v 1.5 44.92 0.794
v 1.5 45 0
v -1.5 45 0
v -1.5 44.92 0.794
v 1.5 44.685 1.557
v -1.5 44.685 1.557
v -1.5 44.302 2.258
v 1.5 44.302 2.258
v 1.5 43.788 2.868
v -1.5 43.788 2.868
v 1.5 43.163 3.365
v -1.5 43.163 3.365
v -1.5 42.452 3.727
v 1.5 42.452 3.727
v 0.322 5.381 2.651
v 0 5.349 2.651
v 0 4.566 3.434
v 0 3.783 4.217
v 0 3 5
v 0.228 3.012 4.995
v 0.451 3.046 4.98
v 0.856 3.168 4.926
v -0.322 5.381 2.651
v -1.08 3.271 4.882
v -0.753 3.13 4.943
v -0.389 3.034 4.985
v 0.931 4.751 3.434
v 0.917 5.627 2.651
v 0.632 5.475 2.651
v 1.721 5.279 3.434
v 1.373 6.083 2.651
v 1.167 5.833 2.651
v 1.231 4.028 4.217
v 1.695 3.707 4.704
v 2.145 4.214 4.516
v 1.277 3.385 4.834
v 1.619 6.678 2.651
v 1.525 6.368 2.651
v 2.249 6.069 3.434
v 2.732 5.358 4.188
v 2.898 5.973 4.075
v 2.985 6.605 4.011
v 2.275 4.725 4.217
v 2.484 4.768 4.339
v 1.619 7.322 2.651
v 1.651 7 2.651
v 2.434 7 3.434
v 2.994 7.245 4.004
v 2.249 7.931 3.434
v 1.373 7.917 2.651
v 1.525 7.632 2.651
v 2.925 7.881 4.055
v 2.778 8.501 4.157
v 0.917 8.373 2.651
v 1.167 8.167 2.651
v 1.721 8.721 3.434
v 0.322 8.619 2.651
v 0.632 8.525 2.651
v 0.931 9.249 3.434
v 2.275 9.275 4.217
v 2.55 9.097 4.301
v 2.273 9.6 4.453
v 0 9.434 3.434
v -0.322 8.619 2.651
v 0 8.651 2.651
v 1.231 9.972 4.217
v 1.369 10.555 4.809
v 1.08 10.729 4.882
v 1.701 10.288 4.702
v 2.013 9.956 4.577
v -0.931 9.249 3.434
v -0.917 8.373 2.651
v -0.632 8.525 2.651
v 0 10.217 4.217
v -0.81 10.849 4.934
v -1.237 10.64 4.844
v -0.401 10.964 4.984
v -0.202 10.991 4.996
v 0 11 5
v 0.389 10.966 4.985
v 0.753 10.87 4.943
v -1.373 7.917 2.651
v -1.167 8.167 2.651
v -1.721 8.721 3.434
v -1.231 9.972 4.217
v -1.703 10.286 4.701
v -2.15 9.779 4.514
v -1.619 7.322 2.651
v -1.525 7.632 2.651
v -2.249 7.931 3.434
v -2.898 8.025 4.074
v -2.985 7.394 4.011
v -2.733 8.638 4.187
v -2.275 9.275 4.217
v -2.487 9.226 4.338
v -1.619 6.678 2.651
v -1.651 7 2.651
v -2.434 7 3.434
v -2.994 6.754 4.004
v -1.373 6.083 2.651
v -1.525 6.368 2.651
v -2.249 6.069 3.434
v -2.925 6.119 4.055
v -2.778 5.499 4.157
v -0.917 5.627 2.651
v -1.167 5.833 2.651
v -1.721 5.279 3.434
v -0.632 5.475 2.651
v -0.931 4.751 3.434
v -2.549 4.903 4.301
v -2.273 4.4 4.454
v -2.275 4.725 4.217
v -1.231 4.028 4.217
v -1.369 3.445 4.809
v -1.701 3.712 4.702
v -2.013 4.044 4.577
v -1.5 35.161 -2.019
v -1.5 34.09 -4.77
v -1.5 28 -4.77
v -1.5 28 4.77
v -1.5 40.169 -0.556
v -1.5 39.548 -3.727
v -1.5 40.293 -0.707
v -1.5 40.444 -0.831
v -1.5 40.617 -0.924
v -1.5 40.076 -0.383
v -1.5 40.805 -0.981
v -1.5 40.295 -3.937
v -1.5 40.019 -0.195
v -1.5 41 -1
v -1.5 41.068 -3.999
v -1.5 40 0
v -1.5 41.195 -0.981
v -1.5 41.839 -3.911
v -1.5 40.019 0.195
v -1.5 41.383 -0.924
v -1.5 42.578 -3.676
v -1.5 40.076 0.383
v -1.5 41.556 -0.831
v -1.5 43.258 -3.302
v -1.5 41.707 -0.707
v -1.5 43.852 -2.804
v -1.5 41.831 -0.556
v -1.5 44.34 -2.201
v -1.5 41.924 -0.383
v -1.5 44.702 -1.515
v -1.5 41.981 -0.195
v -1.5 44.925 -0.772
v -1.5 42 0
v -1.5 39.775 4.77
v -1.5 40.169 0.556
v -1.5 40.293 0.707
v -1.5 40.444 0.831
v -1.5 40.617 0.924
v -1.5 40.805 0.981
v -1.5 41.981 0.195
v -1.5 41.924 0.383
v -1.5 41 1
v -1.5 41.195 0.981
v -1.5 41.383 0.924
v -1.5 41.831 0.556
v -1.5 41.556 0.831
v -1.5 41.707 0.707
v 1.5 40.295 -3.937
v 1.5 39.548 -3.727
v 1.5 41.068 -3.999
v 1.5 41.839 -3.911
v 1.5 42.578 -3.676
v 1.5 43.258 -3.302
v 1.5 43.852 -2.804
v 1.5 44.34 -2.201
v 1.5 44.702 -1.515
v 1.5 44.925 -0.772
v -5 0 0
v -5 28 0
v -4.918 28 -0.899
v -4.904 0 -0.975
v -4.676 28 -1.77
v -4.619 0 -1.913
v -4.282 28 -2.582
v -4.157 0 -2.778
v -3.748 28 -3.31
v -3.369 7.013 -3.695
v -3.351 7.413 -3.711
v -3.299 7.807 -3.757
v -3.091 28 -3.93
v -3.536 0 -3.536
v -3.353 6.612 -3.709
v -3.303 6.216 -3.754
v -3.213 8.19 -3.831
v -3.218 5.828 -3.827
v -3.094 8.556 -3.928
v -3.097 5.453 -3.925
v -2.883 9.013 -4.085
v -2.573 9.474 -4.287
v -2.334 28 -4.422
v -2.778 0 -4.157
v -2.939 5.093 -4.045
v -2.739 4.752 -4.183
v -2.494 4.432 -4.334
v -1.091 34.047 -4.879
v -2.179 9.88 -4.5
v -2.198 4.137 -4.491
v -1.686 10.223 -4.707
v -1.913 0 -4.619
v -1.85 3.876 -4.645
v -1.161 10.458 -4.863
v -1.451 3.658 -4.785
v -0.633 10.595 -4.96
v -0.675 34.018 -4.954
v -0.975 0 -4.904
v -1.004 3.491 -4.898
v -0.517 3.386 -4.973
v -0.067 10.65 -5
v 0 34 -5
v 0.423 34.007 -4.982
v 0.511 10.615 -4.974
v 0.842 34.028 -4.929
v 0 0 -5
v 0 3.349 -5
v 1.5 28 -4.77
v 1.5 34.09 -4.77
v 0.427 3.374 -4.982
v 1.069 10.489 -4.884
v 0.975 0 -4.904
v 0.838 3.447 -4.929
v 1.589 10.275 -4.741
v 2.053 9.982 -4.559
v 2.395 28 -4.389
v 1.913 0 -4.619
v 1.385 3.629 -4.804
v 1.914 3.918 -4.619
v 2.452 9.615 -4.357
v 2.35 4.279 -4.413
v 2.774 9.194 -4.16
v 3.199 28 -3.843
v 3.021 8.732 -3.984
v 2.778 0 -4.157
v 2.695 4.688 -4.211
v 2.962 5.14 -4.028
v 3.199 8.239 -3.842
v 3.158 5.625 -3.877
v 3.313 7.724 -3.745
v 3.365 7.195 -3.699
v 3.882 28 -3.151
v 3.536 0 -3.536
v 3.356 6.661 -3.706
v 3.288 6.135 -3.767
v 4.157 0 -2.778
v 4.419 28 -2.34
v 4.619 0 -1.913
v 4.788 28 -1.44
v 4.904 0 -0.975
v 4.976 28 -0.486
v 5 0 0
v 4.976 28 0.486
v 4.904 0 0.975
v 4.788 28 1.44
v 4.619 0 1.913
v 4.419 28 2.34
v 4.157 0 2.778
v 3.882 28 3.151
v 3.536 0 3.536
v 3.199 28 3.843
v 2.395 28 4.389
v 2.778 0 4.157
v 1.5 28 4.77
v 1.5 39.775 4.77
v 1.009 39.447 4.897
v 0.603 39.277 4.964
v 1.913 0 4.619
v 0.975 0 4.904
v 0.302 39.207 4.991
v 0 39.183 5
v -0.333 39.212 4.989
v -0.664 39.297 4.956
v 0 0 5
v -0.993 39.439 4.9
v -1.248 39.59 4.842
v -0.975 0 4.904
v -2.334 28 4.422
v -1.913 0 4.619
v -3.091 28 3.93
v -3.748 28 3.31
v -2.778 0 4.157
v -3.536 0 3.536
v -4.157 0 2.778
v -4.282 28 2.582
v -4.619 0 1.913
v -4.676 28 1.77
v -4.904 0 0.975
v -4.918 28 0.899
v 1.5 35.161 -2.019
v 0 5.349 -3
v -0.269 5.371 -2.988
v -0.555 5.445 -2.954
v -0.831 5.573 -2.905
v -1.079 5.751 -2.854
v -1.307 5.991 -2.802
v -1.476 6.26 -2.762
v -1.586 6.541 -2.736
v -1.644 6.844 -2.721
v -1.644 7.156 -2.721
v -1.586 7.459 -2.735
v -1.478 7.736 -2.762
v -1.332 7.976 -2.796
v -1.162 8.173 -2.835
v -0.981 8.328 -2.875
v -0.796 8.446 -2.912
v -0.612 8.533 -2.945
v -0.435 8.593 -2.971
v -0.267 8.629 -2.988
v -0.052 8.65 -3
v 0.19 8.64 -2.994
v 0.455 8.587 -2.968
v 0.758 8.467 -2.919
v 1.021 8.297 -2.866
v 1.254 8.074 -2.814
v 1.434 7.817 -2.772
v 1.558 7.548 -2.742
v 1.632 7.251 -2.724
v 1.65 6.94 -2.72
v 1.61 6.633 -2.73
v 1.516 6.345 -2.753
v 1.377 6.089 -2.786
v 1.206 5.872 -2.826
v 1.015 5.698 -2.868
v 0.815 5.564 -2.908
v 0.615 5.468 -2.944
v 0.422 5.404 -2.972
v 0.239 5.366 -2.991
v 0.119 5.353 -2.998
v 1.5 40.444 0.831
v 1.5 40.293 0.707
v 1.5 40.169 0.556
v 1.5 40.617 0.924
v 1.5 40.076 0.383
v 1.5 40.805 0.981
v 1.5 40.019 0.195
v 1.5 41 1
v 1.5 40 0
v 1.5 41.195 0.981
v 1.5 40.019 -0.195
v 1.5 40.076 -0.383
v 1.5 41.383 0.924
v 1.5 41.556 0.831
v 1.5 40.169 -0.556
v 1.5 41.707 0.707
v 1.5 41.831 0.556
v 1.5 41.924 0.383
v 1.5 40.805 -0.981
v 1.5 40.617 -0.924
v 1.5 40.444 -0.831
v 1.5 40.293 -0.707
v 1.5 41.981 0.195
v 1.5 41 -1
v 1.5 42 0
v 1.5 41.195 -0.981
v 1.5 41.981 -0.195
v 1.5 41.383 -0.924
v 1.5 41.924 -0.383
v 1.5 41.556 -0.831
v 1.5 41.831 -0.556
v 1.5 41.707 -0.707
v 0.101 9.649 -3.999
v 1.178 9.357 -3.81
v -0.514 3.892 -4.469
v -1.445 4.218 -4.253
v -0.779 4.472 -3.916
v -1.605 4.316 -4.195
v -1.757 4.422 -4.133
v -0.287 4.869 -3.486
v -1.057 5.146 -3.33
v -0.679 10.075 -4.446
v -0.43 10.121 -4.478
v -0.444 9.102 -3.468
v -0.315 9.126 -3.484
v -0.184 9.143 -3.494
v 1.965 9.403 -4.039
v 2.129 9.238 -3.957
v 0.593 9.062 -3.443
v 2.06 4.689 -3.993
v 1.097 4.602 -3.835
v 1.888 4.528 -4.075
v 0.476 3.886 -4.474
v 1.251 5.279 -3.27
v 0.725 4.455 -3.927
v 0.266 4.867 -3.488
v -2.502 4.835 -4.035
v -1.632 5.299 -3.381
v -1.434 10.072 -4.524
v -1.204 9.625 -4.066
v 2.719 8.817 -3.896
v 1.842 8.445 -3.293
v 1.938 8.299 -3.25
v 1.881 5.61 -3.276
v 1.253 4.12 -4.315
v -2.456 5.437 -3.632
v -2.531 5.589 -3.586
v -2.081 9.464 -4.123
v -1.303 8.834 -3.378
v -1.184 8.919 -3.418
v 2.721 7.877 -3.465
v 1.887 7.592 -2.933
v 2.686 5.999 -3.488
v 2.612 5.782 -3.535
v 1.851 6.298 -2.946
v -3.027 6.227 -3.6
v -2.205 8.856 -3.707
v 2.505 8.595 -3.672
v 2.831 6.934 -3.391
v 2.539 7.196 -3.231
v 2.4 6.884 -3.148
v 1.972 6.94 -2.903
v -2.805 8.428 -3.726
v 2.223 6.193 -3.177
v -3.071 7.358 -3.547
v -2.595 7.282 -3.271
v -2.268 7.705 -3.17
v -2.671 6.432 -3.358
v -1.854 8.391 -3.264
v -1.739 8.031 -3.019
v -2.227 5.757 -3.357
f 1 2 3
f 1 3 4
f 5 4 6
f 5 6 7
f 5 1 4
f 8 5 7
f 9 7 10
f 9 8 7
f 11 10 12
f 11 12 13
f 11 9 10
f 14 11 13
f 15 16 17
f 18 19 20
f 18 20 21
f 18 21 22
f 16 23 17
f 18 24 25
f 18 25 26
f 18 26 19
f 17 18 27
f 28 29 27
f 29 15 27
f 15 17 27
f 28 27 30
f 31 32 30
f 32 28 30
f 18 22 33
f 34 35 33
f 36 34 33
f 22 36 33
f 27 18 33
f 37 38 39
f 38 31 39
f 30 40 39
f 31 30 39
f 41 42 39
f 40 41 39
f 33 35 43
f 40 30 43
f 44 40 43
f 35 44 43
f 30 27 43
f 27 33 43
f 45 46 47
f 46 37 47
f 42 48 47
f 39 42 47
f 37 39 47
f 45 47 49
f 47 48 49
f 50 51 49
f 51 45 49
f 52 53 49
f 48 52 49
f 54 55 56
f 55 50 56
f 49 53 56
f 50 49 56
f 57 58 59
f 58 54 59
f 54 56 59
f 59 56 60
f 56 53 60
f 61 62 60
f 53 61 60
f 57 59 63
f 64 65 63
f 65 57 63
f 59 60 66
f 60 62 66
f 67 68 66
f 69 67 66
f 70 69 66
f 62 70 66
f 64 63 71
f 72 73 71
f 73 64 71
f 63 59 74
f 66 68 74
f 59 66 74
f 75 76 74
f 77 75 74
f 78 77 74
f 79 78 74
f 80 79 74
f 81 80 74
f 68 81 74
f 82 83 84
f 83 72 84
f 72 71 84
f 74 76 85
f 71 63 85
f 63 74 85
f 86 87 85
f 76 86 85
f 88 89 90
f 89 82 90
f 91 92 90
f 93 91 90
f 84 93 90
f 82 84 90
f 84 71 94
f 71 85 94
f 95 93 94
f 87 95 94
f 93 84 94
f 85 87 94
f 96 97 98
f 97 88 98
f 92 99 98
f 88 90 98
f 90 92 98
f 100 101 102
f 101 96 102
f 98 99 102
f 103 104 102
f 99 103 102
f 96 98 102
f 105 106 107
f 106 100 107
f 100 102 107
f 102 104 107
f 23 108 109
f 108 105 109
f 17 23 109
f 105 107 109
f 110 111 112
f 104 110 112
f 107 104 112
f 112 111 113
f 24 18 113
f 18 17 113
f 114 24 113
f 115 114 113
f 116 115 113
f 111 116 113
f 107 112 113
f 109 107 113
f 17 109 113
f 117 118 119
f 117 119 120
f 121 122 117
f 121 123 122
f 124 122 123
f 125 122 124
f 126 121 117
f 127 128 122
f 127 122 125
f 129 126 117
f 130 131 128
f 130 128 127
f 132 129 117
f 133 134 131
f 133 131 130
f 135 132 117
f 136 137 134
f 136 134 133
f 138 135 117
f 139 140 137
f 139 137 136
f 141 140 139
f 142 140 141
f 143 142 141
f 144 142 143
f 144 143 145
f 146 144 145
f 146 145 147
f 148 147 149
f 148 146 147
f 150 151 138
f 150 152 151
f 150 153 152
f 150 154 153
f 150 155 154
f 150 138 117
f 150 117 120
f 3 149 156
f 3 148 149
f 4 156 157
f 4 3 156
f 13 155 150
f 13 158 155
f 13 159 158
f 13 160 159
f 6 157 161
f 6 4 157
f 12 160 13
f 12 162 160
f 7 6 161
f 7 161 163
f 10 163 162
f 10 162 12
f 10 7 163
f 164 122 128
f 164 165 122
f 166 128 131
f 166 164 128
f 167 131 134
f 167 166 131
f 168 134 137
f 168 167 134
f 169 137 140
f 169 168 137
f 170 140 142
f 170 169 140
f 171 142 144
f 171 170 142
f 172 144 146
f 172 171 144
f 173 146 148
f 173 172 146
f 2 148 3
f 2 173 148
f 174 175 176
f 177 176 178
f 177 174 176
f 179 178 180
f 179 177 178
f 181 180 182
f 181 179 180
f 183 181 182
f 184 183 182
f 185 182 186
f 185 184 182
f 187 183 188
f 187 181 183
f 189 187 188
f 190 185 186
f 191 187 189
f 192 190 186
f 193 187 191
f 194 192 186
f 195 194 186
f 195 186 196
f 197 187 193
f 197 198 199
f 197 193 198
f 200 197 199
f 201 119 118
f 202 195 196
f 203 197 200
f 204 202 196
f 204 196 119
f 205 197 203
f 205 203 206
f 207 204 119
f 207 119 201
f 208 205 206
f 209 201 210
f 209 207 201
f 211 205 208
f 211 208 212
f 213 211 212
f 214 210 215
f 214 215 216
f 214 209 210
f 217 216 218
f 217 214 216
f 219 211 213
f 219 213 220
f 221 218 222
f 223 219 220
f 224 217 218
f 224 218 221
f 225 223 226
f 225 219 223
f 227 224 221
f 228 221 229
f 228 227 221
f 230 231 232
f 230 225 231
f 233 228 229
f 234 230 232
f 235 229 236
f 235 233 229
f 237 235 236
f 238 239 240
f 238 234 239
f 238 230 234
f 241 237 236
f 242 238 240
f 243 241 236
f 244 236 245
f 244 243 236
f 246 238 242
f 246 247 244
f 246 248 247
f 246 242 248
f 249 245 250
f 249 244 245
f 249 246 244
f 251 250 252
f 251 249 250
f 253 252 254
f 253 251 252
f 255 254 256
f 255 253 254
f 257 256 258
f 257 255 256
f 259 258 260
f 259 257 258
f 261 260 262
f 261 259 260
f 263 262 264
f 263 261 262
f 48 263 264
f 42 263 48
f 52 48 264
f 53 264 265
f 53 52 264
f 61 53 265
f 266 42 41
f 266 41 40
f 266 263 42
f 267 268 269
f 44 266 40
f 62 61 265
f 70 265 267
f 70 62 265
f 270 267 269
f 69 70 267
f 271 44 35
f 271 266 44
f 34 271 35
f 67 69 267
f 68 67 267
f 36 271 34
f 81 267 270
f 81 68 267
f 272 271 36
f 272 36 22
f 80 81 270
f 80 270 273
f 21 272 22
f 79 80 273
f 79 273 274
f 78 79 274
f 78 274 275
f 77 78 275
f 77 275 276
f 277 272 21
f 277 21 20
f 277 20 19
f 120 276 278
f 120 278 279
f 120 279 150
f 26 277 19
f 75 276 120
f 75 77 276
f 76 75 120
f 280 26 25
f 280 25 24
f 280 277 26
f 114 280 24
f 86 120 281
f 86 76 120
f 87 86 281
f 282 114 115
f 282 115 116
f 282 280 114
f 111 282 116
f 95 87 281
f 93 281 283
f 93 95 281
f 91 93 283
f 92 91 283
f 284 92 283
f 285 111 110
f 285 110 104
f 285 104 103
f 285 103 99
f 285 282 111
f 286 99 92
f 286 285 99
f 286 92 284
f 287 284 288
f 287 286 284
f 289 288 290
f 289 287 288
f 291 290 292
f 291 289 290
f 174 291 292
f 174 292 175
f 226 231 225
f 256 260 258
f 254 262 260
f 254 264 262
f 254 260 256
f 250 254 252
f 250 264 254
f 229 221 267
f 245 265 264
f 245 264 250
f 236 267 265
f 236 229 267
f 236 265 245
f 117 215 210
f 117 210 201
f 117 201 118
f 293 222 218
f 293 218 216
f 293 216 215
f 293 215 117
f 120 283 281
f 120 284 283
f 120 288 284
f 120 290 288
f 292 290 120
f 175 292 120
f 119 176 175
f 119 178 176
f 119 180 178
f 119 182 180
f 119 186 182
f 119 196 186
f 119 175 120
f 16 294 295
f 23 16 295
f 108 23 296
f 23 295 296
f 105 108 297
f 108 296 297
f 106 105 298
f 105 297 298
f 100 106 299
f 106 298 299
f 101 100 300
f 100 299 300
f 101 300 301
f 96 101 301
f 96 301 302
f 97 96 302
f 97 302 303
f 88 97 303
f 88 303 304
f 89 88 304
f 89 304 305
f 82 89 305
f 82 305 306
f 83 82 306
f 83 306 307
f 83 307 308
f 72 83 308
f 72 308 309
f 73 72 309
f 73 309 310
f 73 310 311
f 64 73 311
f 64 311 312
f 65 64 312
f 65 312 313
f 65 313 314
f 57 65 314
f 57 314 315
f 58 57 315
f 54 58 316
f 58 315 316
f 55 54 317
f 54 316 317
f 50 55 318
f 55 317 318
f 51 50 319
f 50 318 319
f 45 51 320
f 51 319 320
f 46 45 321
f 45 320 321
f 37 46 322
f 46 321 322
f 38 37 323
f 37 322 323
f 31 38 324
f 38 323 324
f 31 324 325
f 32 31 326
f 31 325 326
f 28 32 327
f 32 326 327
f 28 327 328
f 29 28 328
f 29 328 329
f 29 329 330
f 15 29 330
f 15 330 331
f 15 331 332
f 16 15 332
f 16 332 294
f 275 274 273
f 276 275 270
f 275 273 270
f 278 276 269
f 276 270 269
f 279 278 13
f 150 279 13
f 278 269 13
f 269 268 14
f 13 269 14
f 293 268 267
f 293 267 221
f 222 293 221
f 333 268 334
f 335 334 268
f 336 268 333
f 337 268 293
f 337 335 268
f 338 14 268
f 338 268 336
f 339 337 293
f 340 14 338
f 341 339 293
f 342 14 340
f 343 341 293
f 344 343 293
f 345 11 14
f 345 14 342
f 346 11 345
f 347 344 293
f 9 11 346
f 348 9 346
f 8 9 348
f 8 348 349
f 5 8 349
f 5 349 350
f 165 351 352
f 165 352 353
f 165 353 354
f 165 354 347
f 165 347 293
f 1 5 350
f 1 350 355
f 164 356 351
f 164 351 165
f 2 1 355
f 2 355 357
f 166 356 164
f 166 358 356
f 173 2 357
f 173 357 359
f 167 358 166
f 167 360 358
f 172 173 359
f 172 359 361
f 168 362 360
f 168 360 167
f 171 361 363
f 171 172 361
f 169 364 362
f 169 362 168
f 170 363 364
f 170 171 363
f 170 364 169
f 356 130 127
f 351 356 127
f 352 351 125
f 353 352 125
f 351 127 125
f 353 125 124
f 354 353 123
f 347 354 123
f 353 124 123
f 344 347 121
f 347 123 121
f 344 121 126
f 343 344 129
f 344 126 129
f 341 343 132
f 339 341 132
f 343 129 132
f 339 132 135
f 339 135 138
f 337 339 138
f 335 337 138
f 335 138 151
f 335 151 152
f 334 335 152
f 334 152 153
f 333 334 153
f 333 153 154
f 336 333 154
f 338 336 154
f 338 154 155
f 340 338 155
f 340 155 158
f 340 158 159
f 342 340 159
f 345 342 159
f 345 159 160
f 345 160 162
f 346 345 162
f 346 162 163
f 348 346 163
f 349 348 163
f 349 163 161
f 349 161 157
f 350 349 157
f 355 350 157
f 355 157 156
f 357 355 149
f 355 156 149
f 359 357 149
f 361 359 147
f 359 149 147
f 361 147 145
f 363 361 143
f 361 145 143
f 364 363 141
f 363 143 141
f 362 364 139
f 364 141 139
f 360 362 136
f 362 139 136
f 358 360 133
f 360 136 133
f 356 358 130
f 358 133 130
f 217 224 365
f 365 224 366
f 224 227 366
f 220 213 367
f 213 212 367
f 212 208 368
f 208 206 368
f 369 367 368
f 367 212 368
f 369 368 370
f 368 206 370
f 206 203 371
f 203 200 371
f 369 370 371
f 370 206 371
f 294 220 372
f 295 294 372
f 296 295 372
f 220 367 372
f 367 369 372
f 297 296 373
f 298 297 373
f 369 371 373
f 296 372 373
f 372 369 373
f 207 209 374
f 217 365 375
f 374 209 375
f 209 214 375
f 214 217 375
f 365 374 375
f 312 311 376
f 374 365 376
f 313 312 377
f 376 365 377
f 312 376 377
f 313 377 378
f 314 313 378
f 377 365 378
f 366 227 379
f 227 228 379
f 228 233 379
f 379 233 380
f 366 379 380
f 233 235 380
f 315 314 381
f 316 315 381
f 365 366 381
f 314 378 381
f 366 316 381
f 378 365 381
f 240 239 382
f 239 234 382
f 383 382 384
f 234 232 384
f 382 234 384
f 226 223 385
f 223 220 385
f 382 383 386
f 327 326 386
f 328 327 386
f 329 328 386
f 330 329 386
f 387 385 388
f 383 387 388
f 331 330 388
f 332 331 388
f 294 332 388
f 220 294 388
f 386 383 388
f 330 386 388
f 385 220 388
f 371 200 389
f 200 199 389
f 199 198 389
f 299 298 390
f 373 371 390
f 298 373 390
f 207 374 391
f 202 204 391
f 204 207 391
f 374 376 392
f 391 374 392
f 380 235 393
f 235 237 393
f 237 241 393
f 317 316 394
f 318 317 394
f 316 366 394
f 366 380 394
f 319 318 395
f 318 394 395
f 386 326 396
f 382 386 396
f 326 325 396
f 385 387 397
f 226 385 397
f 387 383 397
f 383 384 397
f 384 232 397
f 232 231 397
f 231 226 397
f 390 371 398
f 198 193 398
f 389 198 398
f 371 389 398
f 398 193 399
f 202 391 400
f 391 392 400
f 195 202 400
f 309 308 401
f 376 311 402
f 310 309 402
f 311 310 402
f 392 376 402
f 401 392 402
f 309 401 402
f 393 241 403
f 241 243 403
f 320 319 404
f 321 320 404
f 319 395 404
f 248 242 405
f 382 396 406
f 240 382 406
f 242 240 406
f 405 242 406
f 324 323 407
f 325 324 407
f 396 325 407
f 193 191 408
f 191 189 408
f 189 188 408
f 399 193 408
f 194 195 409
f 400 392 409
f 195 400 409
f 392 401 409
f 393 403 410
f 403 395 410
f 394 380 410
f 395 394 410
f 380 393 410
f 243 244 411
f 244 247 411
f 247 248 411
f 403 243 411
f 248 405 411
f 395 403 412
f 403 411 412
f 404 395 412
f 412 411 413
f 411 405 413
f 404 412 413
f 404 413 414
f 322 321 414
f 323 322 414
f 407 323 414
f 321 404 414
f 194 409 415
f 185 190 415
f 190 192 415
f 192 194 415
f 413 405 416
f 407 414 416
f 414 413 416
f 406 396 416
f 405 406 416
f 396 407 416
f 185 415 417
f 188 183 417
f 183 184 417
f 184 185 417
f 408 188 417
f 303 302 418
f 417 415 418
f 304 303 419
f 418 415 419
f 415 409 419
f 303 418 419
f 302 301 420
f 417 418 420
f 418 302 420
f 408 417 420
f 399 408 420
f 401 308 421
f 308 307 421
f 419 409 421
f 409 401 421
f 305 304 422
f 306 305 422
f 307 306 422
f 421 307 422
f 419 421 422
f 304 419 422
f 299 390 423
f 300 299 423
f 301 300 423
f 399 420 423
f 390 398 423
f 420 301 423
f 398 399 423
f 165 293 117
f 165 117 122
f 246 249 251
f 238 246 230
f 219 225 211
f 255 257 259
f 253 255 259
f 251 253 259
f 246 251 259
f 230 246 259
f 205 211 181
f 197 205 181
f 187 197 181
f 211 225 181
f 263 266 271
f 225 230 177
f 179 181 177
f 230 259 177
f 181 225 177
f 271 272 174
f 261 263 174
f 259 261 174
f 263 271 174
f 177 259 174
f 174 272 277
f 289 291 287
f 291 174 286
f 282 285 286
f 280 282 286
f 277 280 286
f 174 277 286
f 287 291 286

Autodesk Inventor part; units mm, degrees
ref_plane "XZ Plane" through (0, 0, 0) normal (0, 1, 0) x (-1, 0, 0)
sketch "Sketch1" plane through (0, 0, 0) normal (0, 1, 0) x (-1, 0, 0)
  circle A0 centre (0, 0) radius 5
  dimension "d0" = 10
extrude "Extrusion1" add sketch "Sketch1" along normal blind 45
ref_plane "Work Plane1" through (0, 0, 5) normal (0, 0, 1) x (1, 0, 0)
sketch "Sketch2" plane through (0, 0, 5) normal (0, 0, 1) x (1, 0, 0)
  point P0 (0, 0)
  point P1 (0, 7)
  dimension "d3" = 7
hole "Hole1" at (0, 7, 5) direction (0, 0, -1) diameter 3.302 end through all countersink diameter 8 countersink angle 90 thread size "8-32 UNC" class "2B" standard "ANSI Unified Screw Threads"
sketch "Sketch5" plane through (0, 45, 0) normal (0, 1, 0) x (1, 0, 0)
  line L0 (-5, 5) -> (-1.5, 5)
  line L1 (-1.5, 5) -> (-1.5, -5)
  line L2 (-1.5, -5) -> (-5, -5)
  line L3 (-5, -5) -> (-5, 5)
  line L4 (1.5, 5) -> (5, 5)
  line L5 (5, 5) -> (5, -5)
  line L6 (5, -5) -> (1.5, -5)
  line L7 (1.5, -5) -> (1.5, 5)
  point P0 (0, 0)
  point P1 (-5, 0)
  point P2 (1.5, 0)
  point P3 (5, 0)
  point P4 (-1.5, 0)
  dimension "d16" = 3
  dimension "d17" = 10
  dimension "d18" = 10
  dimension "d27" = 5
extrude "Extrusion2" cut sketch "Sketch5" against normal blind 17
sketch "Sketch6" plane through (1.5, 45, 4.7697) normal (1, 0, 0) x (0, 0, -1)
  circle A0 centre (4.7697, -4) radius 1
  line L0 (0, 0) -> (9.5394, 0) projected
  line L1 (0, -17) -> (0, 0) projected
  line L2 (0, -17) -> (9.5394, -17) projected
  line L3 (9.5394, 0) -> (0, 0) projected
  line L4 (9.5394, 0) -> (9.5394, -17) projected
  line L5 (4.7697, 0) -> (4.7697, -17)
  point P0 (4.7697, -45)
  dimension "d32" = 2
  dimension "d33" = 4
hole "Hole2" at (1.5, 41, 0) direction (-1, 0, 0) diameter 2 end through all
ref_plane "Work Plane3" through (5, 0, 0) normal (1, 0, 0) x (0, 1, 0)
sketch "Sketch10" plane through (5, 0, 0) normal (1, 0, 0) x (0, 1, 0)
  arc A0 (39.5485, -3.7274) -> (45, 0) centre (41, 0) ccw
  circle A1 centre (41, 0) radius 1 projected
  line L0 (28, 0.7697) -> (39.5485, -3.7274)
  line L1 (28, 4.7697) -> (28, -4.7697) projected
  line L2 (28, 4.7697) -> (45, 4.7697) projected
  line L3 (45, -5) -> (45, -4.7697) projected
  line L4 (34, -5) -> (45, -5)
  line L5 (45, 4.7697) -> (45, 5) projected
  line L6 (45, -5) -> (45, 5)
  line L7 (45, 5) -> (39.1833, 5)
  line L8 (39.1833, 5) -> (42.4515, 3.7274)
  line L9 (45, 4.7697) -> (28, 4.7697) projected
  line L10 (0, 5) -> (45, 5) projected
  line L11 (34, -5) -> (35.1609, -2.0188)
  arc A2 (45, 0) -> (42.4515, 3.7274) centre (41, 0) ccw
  point P0 (0, 0)
  point P1 (45, -4.7697)
  dimension "d54" = 8
  dimension "d55" = 6
  dimension "d56" = 4
extrude "Extrusion3" cut sketch "Sketch10" against normal through all contours A0 L6 L3 L4 L11 L0 | A2 L8 L2 L6 | L2 L8 L7 L5
chamfer "Chamfer1" distance 2 angle 45 1 edges at (-0.2563, 8.631, -4.9934)
properties part number "barrel_hinge-male" material "Stainless Steel"
